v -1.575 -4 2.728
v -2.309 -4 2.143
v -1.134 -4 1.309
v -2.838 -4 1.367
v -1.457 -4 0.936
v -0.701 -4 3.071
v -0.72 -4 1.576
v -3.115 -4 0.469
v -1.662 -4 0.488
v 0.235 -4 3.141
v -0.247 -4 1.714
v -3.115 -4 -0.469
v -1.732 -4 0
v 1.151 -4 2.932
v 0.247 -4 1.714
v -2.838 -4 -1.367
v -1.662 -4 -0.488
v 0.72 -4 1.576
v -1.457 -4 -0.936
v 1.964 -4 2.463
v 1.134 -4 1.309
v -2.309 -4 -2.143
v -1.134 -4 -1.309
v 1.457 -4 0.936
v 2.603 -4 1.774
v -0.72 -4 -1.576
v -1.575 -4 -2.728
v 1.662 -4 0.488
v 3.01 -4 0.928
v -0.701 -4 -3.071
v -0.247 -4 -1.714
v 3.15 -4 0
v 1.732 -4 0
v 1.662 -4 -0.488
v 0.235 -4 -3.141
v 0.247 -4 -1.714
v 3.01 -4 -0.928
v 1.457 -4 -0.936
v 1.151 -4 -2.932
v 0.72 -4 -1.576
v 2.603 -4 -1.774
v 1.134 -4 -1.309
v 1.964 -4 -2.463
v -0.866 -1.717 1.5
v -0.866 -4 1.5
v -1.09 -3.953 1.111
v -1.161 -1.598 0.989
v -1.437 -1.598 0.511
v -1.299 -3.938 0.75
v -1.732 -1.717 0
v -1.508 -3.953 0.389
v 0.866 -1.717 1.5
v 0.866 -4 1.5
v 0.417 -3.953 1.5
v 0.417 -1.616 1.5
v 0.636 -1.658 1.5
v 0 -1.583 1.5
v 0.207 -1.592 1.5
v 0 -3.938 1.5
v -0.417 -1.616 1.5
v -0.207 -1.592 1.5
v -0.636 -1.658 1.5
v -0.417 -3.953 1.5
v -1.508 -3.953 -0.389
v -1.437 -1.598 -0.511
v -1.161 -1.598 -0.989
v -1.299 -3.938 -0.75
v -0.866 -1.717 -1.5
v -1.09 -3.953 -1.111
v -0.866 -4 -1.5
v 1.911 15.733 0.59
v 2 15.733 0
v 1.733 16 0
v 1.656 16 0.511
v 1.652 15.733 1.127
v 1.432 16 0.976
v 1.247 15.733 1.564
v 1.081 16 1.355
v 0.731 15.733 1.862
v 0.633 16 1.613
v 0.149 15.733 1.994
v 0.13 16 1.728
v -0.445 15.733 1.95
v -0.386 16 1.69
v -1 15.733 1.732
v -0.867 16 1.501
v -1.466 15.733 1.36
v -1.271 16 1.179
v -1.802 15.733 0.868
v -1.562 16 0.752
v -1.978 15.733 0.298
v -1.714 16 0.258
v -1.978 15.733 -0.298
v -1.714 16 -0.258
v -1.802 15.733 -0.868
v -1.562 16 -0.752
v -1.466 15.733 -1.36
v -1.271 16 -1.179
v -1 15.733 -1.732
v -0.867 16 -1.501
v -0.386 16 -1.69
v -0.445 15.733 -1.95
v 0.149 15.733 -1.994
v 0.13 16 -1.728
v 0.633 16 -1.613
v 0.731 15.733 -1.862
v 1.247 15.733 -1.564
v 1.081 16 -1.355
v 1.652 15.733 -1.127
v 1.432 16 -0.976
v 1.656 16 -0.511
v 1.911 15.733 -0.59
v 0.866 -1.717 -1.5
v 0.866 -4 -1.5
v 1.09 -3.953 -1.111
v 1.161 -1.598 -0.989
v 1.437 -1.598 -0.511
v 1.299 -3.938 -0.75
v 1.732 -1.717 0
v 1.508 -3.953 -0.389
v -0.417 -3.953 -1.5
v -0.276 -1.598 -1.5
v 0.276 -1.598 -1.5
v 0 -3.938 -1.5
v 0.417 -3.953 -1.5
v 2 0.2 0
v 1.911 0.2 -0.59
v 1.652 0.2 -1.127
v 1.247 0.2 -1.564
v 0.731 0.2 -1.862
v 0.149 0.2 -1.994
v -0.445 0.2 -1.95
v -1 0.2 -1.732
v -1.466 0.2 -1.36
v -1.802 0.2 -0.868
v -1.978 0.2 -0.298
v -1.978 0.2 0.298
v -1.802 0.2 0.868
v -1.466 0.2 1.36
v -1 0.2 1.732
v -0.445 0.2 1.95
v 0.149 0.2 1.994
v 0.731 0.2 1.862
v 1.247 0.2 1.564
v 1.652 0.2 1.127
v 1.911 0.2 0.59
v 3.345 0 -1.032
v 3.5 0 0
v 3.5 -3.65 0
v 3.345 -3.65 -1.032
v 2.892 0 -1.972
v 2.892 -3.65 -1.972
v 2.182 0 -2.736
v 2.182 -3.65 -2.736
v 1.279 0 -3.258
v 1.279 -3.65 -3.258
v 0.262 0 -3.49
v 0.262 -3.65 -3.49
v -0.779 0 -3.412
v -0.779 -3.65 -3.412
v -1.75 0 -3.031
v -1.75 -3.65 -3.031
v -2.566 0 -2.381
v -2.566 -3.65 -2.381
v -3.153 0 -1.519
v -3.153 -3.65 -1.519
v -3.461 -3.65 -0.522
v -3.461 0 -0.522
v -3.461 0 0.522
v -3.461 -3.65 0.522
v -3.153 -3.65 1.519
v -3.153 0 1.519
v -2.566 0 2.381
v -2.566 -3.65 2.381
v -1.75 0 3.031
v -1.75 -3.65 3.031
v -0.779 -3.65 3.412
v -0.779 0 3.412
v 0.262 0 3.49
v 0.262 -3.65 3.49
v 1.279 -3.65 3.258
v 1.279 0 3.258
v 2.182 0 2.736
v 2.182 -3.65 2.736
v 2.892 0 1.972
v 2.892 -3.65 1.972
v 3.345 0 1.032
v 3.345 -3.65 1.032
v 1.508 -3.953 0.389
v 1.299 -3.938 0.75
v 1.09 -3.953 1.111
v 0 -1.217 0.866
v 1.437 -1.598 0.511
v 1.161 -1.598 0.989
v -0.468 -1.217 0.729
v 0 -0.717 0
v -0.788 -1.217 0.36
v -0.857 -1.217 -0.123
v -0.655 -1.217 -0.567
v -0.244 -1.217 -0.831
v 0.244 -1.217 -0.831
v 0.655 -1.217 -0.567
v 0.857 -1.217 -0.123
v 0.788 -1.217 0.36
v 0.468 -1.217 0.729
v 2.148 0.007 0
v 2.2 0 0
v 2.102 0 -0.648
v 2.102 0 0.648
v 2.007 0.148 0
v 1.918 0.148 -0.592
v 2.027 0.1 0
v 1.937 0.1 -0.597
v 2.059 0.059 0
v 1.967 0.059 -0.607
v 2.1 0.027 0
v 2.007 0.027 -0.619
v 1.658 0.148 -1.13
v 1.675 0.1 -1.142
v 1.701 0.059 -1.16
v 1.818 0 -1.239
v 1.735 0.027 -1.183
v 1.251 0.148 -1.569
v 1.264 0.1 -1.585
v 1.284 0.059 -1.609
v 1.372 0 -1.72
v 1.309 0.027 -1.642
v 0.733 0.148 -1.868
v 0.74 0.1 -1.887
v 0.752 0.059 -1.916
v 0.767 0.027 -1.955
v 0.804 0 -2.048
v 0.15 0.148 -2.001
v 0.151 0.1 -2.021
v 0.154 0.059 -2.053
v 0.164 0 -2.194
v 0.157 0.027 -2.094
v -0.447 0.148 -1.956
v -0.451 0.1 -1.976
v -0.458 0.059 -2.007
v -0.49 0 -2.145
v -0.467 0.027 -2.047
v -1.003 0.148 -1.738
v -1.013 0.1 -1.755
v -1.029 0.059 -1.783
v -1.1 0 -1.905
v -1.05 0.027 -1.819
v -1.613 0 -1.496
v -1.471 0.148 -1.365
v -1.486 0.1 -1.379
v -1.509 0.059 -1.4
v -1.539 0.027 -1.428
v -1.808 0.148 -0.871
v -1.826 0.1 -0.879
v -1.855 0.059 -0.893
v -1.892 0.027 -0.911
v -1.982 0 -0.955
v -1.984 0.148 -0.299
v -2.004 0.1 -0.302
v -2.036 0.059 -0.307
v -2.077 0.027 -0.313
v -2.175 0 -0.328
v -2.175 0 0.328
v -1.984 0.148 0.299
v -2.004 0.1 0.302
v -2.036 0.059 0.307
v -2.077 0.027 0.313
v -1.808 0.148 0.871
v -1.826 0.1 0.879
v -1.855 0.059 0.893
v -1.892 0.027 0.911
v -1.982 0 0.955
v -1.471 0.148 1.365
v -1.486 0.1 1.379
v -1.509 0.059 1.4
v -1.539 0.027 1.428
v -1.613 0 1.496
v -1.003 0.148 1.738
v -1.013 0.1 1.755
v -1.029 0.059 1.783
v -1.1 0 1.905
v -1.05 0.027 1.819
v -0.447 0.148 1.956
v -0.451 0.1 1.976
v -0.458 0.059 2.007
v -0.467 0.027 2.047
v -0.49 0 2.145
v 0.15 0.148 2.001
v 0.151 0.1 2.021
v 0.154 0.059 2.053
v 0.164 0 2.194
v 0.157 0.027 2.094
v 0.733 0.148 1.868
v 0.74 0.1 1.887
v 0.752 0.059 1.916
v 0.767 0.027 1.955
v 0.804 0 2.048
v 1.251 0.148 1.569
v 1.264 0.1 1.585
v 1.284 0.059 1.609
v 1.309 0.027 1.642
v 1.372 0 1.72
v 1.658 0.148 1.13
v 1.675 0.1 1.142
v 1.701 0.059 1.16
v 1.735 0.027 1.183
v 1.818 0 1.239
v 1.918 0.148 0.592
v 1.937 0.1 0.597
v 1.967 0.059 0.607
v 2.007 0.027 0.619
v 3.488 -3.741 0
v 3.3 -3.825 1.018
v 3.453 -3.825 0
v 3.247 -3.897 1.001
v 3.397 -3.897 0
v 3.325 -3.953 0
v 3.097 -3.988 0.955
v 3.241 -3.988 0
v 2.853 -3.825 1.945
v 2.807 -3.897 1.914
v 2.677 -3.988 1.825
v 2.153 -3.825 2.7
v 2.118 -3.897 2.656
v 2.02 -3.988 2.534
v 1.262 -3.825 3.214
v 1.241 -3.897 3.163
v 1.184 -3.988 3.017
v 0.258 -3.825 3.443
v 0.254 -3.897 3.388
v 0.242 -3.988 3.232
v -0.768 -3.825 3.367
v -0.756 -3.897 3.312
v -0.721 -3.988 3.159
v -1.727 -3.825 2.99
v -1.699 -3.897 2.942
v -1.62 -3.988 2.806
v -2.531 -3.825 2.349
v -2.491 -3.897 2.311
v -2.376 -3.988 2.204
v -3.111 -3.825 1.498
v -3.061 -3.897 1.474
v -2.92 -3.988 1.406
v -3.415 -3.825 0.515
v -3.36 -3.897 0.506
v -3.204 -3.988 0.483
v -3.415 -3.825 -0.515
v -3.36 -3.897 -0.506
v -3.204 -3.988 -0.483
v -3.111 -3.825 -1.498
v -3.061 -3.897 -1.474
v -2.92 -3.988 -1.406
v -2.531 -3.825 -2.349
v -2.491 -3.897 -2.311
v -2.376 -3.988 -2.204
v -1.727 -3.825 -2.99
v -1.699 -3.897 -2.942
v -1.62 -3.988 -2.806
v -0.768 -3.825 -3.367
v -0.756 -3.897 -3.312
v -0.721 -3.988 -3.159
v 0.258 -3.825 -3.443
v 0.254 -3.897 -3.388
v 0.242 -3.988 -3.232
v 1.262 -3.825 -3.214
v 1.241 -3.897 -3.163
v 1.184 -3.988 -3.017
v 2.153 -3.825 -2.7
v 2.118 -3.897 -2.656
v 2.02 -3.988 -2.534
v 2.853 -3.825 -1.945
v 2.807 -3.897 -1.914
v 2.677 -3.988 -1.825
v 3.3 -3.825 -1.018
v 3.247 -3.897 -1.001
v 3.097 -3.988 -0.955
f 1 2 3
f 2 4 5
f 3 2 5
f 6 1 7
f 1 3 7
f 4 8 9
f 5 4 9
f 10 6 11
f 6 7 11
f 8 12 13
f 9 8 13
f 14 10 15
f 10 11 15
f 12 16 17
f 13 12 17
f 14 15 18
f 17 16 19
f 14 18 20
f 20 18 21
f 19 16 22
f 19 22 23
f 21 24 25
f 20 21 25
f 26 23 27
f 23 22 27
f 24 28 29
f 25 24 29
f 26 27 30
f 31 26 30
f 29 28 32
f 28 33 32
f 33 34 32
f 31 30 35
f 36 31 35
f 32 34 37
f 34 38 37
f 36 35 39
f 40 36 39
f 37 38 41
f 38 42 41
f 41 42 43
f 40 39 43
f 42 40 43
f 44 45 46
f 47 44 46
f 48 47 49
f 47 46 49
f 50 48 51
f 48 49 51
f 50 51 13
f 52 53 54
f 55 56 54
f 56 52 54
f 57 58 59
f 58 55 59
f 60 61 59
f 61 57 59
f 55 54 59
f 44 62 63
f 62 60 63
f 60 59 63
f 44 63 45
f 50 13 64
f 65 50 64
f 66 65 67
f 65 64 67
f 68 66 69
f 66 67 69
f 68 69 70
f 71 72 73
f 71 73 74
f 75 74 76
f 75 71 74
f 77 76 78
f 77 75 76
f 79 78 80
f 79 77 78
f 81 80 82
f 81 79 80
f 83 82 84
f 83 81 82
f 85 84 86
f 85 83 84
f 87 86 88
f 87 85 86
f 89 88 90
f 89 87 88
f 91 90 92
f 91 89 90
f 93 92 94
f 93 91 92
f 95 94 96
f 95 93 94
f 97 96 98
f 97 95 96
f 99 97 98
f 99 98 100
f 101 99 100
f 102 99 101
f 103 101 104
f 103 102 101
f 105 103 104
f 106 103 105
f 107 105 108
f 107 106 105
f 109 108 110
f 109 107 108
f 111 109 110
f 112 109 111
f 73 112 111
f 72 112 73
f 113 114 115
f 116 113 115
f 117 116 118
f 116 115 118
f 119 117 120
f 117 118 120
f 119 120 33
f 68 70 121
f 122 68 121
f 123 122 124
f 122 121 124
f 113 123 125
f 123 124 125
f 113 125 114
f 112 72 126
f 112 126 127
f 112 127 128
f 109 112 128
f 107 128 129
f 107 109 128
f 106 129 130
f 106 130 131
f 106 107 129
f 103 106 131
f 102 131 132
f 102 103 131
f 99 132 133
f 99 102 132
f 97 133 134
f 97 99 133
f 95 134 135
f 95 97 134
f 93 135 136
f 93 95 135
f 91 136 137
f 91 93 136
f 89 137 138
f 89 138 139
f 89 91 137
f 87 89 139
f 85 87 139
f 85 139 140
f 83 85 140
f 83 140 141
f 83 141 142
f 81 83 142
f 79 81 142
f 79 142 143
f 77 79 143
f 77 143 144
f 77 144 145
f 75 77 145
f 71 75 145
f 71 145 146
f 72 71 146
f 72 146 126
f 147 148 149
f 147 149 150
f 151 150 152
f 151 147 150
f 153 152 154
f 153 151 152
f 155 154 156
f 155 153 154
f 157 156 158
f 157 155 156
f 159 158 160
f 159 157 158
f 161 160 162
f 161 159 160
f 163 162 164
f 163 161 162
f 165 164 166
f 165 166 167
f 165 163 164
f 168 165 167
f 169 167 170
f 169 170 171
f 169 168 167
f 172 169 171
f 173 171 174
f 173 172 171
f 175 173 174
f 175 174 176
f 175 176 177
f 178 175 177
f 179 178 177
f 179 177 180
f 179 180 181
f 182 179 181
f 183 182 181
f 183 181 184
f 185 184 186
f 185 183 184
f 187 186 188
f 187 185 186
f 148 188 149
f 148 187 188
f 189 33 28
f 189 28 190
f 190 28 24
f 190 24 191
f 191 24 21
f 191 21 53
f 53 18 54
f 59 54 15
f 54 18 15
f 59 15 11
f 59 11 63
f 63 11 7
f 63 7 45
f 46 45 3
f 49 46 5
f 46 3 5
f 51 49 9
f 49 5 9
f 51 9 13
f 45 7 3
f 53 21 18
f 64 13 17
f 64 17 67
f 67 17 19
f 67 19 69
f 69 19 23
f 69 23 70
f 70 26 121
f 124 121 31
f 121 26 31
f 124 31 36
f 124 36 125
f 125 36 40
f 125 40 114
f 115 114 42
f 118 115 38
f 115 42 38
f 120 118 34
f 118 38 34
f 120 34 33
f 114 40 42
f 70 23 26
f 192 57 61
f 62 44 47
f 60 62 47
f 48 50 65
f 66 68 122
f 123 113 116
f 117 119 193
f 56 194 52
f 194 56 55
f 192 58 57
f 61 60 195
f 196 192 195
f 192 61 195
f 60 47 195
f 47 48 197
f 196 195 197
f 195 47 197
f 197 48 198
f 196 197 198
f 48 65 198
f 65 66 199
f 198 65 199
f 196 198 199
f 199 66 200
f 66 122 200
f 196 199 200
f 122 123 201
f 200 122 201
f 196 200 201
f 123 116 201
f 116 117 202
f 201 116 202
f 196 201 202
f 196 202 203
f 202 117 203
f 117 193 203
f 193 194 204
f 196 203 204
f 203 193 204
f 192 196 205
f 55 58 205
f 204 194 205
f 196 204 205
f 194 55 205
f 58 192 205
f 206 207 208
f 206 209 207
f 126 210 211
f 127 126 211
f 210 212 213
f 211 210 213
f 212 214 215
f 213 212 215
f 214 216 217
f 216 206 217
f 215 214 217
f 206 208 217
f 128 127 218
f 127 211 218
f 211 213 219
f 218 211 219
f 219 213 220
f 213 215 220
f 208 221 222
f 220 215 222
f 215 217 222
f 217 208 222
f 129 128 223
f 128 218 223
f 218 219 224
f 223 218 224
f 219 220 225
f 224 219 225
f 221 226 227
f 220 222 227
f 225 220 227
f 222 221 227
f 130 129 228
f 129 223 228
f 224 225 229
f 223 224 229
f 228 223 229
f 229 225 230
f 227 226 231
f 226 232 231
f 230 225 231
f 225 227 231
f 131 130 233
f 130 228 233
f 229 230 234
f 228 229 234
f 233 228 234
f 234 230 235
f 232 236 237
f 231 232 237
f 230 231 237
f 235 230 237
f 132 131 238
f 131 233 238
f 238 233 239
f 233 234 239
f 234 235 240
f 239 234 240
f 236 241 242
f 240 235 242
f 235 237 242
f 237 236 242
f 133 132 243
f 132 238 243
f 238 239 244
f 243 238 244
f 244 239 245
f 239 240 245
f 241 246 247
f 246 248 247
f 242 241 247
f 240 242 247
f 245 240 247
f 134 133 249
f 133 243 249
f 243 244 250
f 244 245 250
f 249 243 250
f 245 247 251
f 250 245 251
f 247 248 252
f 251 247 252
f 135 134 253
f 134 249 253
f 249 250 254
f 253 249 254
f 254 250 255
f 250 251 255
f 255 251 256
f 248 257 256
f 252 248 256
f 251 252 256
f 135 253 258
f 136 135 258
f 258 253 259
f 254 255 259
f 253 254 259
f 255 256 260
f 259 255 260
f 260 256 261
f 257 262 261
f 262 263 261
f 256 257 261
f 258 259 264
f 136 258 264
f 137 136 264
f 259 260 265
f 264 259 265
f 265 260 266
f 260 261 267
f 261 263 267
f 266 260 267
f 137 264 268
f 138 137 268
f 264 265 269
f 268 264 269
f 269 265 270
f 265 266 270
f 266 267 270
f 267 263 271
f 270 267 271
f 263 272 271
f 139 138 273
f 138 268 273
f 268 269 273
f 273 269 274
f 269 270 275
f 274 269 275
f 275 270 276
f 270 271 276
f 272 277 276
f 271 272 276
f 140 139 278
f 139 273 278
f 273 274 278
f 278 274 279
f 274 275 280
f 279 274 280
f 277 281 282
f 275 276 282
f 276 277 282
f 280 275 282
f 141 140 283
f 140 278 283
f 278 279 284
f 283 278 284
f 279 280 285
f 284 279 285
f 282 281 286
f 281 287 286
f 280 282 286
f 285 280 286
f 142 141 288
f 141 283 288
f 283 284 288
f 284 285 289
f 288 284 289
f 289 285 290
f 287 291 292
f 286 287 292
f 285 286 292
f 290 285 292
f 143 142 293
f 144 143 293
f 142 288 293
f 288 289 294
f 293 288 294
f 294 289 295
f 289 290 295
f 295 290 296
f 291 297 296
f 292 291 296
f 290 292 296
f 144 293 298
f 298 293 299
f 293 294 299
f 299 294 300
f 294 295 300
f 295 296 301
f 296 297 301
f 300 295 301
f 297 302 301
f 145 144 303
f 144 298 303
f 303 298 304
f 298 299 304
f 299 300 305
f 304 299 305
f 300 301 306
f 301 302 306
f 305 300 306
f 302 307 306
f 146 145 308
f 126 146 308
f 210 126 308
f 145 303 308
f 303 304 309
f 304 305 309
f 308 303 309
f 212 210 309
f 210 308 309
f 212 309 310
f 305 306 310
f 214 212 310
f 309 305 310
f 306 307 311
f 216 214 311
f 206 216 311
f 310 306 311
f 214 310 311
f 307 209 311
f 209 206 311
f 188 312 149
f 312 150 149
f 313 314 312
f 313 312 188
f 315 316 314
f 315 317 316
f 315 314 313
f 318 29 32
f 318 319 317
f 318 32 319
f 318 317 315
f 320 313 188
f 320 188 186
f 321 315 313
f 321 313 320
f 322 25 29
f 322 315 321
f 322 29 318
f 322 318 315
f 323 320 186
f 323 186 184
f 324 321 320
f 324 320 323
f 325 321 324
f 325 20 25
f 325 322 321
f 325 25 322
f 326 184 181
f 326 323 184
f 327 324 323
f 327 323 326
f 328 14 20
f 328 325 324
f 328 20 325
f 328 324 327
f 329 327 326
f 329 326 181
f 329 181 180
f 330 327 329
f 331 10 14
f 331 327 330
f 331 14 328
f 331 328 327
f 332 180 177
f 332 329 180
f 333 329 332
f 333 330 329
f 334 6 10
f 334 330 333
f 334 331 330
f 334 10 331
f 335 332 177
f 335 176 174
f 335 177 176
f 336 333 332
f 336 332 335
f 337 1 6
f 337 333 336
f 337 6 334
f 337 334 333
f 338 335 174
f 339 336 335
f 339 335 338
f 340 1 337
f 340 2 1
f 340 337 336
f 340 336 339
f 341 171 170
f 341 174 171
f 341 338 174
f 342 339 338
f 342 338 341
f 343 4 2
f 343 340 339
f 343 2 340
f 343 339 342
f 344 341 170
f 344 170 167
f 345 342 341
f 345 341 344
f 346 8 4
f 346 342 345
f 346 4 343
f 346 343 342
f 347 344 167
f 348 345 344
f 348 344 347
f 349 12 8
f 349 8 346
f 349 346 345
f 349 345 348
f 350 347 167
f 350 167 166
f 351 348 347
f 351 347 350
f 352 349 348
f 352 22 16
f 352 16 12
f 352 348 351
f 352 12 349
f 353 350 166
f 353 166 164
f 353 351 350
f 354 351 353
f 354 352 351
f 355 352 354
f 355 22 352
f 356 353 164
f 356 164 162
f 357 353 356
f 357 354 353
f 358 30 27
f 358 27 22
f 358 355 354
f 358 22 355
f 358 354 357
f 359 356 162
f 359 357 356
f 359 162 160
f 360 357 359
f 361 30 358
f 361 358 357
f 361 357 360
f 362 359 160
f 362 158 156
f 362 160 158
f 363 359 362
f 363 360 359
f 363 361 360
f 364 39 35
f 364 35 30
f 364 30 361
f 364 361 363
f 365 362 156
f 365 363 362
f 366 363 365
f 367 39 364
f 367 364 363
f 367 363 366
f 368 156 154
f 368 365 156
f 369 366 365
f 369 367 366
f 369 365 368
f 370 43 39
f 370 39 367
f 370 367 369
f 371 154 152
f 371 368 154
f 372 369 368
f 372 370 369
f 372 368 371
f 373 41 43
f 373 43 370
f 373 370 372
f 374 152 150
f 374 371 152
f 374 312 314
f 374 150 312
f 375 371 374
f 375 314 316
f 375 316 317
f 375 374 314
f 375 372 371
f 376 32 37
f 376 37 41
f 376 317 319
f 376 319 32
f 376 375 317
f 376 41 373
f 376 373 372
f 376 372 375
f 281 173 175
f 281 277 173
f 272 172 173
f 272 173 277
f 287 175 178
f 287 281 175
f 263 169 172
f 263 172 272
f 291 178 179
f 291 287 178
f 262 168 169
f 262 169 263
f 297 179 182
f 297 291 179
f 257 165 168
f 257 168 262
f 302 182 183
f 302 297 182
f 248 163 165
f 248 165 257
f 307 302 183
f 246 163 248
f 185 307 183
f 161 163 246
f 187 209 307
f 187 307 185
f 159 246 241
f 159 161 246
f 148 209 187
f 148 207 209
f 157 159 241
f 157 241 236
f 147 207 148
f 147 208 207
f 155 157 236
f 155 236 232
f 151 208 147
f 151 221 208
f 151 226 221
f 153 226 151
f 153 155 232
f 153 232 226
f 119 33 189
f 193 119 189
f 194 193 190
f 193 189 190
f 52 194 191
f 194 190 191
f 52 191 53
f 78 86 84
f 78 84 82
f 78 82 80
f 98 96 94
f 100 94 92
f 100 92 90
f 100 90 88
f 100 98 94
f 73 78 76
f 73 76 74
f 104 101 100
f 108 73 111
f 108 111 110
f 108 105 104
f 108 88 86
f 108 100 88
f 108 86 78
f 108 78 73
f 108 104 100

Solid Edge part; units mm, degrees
sketch "Sketch1" plane through (0, 0, 0) normal (0, 0, 1) x (1, 0, 0)
  line L0 (2, 0) -> (2, 16)
  line L1 (0, 16) -> (2, 16)
  line L2 (0, 0) -> (0, 16)
  line L3 (0, 0) -> (0, -4)
  line L4 (0, -4) -> (3.5, -4)
  line L5 (3.5, -4) -> (3.5, 0)
  line L6 (3.5, 0) -> (2, 0)
revolve "RevolvedProtrusion1" add sketch "Sketch1" angle 360 about axis through (0, 0, 0) along (0, 1, 0)
sketch "Sketch2" plane through (0, 0, 0) normal (1, 0, 0) x (0, 1, 0)
  line L0 (-4, 2.2215) -> (-2, 2.2215)
  line L1 (-0.7174, 0) -> (-2, 2.2215)
  line L2 (-4, 0) -> (-0.7174, 0)
  line L3 (-4, 0) -> (-4, 2.2215)
revolve "RevolvedCutout1" cut sketch "Sketch2" angle 360 about axis through (0, -4.5, 0) along (0, 1, 0)
sketch "Sketch3" plane through (0, -4, 0) normal (0, -1, 0) x (0, 0, 1)
  circle A0 centre (0, 0) radius 2.2215
  line L0 (-1.5, -0.866) -> (0, -1.7321)
  line L1 (0, -1.7321) -> (1.5, -0.866)
  line L2 (1.5, -0.866) -> (1.5, 0.866)
  line L3 (1.5, 0.866) -> (0, 1.7321)
  line L4 (0, 1.7321) -> (-1.5, 0.866)
  line L5 (-1.5, 0.866) -> (-1.5, -0.866)
  dimension "D1" = 3
extrude "Protrusion1" add sketch "Sketch3" against normal up to next
sketch "Sketch4" plane through (0, 0, 0) normal (0, 0, 1) x (1, 0, 0)
  line L0 (-1.7321, -4) -> (0, -4)
  line L1 (0, -4) -> (0, -3.5359)
  line L2 (0, -3.5359) -> (-1.7321, -4)
revolve "RevolvedCutout2" cut sketch "Sketch4" angle 360 about axis through (0, -4.5, 0) along (0, 1, 0)
fillet "Round1" radius 0.2 1 edges at (0, 0, -2)
fillet "Round2" radius 0.35 1 edges at (0, -4, -3.5)
chamfer "倒斜角_2" distance 0.2667 angle 45 1 edges at (0, 16, -2)
cosmetic_thread "螺纹_3" size "M4" thread depth 12.8
properties part number "N2611-031H" material "铝 1060"
